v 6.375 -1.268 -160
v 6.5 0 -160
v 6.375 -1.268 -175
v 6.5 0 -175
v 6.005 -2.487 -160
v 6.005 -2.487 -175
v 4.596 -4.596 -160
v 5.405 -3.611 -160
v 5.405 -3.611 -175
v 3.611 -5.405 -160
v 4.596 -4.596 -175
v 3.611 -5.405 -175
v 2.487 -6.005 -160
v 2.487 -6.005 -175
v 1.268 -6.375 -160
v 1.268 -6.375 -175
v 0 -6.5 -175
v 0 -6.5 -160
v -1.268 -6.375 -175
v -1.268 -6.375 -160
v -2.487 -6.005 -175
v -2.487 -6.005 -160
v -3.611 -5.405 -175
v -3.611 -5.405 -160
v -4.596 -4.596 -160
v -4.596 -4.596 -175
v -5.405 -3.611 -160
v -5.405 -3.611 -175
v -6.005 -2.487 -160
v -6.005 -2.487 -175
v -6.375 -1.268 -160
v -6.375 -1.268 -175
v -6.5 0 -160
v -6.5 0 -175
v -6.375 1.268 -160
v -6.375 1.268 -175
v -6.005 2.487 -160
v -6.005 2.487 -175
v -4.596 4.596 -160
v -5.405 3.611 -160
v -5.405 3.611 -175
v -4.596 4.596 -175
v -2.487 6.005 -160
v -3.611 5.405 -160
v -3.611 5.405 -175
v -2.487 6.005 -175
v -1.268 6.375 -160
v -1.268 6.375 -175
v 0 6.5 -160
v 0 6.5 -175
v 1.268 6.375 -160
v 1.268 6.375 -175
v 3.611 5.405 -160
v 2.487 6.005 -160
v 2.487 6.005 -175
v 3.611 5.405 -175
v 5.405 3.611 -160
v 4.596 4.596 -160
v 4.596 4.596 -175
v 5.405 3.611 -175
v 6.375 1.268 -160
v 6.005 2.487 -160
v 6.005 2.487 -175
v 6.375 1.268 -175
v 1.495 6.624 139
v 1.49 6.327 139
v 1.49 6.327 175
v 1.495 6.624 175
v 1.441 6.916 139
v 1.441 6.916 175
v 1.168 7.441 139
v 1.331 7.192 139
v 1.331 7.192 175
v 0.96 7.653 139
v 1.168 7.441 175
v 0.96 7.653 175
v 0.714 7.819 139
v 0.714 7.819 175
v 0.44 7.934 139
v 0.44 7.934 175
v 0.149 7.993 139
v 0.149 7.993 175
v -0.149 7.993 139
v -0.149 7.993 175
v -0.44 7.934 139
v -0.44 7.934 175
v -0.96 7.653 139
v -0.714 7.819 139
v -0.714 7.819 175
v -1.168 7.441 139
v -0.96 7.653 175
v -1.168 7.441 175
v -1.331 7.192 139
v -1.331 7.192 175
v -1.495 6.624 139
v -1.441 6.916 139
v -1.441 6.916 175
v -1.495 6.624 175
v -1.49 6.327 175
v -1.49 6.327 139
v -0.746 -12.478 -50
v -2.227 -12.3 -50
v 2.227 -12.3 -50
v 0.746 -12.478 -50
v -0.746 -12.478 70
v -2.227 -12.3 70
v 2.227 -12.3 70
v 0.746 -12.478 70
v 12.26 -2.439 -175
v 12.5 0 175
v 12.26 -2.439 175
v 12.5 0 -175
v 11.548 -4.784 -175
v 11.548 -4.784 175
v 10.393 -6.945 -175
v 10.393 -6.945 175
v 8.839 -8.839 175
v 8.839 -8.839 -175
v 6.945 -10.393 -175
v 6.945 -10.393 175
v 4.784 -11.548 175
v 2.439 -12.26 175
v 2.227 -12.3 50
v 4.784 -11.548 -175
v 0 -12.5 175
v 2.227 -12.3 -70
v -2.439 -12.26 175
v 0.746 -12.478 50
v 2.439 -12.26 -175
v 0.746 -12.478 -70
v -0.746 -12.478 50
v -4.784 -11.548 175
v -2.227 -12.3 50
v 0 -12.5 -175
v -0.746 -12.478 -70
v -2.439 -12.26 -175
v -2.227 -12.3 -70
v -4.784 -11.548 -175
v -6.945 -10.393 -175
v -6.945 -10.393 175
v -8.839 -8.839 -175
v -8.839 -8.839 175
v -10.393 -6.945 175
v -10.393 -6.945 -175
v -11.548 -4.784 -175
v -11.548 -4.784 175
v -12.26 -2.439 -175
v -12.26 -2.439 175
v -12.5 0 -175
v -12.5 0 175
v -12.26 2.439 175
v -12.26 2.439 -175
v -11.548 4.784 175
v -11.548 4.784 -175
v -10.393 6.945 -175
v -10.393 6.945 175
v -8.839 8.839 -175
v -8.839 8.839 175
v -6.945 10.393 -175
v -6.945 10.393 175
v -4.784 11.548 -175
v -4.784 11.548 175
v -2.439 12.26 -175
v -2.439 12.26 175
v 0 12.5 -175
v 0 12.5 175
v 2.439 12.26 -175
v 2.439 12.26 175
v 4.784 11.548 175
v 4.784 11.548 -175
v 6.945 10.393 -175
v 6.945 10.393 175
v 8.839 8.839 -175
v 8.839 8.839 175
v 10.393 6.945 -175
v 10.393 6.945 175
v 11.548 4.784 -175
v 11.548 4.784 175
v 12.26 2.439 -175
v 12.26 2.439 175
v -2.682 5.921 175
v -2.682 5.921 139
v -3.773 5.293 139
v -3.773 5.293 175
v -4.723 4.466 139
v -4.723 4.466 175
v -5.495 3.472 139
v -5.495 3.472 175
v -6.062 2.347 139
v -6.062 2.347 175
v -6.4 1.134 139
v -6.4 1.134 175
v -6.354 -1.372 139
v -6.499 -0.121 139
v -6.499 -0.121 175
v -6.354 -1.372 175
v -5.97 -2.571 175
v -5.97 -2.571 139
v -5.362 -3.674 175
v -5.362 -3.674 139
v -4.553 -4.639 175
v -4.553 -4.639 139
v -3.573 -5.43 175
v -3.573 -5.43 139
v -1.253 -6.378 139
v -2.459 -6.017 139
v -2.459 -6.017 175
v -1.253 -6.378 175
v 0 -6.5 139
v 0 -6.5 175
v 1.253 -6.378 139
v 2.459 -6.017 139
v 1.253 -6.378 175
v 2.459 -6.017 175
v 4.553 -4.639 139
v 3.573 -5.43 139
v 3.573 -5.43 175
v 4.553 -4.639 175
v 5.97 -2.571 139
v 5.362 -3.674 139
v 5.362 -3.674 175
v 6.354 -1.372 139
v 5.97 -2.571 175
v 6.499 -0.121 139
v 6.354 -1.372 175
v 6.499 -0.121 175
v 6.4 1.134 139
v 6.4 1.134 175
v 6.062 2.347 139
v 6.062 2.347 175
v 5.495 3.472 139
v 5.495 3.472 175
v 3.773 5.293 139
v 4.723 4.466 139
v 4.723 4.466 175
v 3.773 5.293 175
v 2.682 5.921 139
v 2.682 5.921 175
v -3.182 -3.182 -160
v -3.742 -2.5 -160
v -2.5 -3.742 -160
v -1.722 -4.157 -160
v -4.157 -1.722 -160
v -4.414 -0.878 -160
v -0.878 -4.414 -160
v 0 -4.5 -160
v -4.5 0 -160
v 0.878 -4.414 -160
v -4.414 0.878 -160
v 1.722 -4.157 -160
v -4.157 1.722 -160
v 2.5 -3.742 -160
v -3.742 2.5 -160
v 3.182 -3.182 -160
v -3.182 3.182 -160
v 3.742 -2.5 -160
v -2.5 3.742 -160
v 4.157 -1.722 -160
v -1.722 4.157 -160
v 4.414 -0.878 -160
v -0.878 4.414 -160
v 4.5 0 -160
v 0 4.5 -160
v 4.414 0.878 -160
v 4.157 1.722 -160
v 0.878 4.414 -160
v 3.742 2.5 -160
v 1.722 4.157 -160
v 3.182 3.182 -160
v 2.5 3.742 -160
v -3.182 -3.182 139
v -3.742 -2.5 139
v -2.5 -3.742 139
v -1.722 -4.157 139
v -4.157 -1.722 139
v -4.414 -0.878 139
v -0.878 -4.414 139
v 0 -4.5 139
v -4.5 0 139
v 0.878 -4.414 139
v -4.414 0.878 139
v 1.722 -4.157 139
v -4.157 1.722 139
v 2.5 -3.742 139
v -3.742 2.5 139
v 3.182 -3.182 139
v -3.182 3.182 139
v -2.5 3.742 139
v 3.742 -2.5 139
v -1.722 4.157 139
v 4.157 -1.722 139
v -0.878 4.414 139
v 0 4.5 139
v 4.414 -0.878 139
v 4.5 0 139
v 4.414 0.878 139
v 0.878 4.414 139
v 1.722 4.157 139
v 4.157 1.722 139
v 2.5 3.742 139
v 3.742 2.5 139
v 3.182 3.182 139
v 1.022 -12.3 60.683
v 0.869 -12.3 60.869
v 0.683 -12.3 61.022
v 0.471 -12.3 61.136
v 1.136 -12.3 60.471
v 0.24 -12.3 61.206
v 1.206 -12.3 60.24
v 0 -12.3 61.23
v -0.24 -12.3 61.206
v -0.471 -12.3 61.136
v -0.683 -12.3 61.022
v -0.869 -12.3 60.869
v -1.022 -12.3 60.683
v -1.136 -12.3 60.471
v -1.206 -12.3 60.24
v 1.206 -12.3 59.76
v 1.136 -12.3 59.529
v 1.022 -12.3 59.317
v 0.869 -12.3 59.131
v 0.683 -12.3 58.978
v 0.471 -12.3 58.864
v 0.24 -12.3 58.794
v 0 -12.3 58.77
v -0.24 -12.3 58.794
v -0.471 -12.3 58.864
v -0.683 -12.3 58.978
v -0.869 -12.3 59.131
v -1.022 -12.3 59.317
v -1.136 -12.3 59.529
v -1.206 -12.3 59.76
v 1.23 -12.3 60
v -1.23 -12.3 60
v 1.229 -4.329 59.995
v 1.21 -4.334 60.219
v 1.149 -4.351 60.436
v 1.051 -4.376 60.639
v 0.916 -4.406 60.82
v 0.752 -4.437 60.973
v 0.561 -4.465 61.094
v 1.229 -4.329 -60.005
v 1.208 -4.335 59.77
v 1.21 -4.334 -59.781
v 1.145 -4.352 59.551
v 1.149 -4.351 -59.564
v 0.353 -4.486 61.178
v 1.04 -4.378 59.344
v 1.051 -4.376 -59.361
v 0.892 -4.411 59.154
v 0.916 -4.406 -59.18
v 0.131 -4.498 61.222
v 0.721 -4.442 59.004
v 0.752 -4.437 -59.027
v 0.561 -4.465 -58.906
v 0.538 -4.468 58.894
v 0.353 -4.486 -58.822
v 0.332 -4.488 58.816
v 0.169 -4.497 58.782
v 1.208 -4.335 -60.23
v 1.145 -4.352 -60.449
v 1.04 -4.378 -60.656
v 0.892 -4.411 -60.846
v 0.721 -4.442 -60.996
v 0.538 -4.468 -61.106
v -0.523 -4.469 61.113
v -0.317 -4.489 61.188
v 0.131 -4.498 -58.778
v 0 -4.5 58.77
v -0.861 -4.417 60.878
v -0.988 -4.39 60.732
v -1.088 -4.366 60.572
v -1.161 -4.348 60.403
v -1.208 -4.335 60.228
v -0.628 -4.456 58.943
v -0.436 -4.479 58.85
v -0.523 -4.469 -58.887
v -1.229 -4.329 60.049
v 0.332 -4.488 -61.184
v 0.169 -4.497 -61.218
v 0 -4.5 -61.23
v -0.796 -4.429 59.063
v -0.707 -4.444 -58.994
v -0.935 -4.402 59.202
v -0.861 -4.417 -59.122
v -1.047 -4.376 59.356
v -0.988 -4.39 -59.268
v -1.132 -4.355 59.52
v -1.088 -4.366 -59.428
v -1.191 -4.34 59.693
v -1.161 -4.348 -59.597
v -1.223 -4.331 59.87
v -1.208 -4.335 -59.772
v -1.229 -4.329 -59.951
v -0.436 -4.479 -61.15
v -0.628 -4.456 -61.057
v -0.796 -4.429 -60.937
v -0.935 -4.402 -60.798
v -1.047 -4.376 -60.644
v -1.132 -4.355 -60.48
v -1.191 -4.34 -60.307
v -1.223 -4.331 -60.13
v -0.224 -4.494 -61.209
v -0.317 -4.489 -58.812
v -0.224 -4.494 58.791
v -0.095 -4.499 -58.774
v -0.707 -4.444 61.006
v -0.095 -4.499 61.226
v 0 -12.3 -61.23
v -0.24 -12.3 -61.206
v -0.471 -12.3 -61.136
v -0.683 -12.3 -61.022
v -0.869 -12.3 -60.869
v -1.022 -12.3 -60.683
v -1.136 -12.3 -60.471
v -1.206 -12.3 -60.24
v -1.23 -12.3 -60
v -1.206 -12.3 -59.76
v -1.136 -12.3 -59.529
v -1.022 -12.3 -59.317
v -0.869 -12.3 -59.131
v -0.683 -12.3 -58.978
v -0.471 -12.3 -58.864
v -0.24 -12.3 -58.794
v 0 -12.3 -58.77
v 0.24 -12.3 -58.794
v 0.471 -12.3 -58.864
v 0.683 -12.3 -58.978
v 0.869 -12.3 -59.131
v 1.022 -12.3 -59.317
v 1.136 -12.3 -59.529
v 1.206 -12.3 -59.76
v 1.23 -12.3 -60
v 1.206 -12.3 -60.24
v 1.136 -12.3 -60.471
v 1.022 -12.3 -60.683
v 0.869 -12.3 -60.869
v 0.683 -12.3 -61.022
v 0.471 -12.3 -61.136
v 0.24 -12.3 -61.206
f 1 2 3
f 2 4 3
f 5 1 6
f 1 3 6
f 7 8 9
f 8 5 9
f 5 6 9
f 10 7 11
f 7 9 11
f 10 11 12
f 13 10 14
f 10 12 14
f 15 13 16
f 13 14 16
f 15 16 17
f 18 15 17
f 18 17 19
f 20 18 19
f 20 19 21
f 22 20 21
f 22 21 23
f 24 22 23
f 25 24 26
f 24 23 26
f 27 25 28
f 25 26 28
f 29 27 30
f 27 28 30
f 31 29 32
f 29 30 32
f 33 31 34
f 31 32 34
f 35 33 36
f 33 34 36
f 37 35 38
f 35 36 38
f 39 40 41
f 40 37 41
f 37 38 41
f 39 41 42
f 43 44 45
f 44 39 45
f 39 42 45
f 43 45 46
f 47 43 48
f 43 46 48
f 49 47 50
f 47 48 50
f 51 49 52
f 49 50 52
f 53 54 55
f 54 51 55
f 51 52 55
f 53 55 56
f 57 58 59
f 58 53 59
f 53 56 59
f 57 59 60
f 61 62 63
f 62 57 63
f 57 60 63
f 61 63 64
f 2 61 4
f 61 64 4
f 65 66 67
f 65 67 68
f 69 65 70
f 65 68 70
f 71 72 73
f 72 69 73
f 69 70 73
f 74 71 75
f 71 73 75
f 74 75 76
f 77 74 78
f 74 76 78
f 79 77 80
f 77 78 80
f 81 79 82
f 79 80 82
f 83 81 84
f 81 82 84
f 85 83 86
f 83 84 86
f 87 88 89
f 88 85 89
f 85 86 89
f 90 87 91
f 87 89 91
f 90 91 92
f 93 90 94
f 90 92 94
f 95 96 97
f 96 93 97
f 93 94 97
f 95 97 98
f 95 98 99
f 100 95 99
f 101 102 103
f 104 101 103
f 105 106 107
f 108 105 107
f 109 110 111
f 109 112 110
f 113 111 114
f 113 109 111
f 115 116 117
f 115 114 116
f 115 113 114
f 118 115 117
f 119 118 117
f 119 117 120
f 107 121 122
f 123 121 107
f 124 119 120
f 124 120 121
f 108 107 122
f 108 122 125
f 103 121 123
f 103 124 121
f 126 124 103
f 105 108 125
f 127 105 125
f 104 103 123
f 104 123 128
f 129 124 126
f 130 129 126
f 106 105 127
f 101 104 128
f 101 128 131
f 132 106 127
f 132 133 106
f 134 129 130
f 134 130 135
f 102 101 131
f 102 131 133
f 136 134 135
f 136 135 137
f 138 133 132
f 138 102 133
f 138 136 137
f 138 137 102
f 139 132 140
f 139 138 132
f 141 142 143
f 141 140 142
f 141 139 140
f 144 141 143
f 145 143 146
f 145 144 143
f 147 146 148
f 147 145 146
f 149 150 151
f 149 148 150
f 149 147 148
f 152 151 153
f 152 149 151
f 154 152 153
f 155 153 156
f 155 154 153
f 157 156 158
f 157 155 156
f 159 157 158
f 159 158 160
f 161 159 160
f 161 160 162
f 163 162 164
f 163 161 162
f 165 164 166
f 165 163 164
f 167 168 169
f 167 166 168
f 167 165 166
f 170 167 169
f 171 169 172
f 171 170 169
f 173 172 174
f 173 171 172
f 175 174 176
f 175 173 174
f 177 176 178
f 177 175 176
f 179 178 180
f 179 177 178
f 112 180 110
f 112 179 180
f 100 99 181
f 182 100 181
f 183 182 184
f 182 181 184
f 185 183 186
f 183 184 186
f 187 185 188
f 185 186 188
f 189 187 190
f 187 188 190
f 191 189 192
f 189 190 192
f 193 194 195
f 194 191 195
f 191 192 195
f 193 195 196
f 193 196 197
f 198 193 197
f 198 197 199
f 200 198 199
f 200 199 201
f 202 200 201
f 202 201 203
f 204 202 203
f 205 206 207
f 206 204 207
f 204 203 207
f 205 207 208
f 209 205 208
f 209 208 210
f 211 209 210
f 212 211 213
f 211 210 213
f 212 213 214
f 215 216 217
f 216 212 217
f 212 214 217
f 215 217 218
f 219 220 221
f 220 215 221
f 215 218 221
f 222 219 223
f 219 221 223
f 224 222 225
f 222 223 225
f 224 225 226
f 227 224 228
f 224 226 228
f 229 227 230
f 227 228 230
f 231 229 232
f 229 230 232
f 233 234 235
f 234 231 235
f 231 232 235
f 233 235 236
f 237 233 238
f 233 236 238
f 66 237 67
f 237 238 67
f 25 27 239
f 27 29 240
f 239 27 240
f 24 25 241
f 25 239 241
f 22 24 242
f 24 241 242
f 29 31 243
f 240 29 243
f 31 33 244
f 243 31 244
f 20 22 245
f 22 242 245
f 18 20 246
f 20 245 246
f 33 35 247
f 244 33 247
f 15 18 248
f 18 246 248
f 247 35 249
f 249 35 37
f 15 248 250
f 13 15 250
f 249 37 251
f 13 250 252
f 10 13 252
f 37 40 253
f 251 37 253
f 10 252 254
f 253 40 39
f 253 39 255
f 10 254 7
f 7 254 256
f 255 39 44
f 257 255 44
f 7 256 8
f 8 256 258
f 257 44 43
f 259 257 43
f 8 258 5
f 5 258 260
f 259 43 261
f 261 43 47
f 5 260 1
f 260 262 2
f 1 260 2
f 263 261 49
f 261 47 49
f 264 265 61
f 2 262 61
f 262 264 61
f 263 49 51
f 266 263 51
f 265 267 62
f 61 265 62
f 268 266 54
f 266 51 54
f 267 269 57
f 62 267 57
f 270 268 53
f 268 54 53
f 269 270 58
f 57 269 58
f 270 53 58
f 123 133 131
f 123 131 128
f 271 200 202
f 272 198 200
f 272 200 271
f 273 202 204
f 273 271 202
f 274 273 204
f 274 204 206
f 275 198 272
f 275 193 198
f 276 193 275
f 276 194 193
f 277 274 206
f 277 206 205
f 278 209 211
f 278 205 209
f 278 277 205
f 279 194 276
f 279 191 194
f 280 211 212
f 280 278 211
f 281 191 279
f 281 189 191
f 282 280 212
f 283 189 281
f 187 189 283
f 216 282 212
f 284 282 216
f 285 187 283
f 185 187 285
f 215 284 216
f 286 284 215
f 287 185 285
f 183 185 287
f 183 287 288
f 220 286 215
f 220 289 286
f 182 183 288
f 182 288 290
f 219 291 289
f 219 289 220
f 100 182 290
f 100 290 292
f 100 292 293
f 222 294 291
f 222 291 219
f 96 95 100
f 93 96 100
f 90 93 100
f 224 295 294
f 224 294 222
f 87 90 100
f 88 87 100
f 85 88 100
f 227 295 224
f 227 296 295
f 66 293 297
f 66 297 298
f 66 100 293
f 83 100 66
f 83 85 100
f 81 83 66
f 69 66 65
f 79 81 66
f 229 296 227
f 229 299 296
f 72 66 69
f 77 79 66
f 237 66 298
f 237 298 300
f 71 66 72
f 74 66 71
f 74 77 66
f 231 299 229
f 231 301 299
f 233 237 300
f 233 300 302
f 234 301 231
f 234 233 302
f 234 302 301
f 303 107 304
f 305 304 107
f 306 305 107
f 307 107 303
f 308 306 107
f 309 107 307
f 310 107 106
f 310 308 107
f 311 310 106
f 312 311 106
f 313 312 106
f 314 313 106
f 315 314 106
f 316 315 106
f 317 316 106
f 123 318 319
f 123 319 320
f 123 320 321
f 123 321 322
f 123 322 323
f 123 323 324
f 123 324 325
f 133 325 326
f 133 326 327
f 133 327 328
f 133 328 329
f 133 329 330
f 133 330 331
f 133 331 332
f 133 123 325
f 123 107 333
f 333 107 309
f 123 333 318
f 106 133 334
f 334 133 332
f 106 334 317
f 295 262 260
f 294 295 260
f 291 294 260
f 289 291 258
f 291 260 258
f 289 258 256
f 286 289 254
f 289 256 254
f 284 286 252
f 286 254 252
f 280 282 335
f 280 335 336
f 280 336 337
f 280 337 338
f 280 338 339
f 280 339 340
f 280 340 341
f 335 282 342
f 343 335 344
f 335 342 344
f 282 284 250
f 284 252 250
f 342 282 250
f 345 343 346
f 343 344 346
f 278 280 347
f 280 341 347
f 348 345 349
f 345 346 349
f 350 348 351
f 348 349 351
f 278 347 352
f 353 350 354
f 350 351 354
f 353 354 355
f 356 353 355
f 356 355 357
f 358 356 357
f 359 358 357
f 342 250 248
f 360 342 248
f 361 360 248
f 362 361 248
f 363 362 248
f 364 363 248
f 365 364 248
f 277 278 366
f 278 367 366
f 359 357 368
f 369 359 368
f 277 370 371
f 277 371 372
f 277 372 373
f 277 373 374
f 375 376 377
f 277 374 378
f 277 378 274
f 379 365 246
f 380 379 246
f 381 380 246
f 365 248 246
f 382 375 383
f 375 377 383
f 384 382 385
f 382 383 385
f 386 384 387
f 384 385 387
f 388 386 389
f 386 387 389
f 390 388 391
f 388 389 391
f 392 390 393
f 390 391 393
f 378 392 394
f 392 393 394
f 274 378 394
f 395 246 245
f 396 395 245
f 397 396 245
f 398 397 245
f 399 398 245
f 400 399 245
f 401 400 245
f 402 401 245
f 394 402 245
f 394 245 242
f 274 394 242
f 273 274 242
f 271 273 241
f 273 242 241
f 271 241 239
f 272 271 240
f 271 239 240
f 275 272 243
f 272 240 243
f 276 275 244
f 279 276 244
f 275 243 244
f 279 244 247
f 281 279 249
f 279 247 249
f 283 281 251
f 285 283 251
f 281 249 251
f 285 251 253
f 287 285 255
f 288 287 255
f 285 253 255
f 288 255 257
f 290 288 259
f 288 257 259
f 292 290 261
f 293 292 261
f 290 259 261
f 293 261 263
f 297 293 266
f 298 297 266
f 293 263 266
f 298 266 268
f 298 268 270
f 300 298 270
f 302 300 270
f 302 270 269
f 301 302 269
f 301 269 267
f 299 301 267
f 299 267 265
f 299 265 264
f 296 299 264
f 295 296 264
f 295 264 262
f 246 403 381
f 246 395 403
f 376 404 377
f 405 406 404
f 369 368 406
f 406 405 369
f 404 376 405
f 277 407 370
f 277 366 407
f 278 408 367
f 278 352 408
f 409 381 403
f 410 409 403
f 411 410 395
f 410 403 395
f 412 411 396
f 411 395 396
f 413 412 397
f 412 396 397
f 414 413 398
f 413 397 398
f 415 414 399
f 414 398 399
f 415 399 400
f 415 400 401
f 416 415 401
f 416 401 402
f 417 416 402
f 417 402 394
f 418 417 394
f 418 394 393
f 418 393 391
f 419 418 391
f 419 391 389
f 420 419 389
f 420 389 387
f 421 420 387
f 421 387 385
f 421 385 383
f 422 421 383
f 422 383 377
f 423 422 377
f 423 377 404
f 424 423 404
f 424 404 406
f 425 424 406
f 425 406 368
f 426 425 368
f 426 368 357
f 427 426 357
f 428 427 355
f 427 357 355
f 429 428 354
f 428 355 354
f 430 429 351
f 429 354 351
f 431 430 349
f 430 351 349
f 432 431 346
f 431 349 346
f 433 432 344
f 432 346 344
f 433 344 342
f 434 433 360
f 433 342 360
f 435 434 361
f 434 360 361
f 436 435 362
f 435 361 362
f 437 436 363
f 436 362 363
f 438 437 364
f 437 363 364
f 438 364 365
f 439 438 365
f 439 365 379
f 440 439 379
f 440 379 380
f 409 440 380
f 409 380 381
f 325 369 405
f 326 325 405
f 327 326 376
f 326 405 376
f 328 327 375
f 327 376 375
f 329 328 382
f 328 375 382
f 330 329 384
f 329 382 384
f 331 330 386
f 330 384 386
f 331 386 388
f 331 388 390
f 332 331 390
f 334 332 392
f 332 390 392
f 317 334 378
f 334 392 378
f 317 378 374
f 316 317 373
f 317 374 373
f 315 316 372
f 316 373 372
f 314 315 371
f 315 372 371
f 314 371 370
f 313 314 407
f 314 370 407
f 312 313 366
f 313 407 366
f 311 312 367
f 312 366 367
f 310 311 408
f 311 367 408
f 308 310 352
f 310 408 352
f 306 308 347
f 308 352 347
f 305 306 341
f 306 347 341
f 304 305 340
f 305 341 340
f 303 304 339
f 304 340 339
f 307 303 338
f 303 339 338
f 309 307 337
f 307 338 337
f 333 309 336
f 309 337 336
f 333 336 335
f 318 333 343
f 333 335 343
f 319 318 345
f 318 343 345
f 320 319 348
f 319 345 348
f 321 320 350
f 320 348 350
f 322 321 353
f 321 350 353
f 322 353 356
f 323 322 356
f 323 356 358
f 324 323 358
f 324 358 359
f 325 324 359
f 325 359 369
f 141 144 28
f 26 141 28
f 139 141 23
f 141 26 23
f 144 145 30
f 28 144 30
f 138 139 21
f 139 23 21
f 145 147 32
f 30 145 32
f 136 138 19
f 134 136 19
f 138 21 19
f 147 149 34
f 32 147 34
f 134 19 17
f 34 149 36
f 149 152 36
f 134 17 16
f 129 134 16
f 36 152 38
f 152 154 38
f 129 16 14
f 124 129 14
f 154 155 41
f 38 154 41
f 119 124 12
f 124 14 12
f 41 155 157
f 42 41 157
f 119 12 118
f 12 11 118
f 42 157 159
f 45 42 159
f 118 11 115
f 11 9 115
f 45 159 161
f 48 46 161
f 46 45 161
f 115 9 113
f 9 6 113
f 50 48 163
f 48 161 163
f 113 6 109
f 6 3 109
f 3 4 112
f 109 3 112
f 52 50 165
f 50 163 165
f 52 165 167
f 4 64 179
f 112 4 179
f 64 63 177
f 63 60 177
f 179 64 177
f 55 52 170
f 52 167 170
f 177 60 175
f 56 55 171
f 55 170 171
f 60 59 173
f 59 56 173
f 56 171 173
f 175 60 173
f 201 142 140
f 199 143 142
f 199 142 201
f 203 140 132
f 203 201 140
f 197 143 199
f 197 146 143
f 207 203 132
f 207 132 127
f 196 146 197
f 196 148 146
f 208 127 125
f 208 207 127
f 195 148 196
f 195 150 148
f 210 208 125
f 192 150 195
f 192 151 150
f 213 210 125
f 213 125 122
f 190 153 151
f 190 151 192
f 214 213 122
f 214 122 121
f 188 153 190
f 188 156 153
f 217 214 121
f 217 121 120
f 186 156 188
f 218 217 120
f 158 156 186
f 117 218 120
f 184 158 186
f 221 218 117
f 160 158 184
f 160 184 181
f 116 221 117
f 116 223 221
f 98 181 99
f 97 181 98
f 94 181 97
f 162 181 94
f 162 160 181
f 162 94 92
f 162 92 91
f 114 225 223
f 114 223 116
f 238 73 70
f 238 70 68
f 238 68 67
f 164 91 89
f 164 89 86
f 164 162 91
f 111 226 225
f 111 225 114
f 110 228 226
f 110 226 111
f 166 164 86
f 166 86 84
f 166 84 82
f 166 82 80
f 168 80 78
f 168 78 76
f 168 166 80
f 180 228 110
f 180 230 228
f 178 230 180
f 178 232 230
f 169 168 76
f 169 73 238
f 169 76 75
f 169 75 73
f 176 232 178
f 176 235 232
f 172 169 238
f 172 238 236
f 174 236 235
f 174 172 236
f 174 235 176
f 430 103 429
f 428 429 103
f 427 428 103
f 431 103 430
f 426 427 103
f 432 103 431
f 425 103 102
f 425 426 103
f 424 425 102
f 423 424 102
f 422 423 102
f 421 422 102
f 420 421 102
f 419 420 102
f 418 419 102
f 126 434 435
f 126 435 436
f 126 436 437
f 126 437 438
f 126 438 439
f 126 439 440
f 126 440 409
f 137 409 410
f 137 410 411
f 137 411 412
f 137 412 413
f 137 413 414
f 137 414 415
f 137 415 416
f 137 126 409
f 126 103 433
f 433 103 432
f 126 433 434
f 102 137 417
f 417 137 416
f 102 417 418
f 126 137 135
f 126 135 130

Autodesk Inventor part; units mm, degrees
ref_plane "YZ Plane" through (0, 0, 0) normal (1, 0, 0) x (0, 1, 0)
sketch "草图1" plane through (0, 0, 0) normal (0, 0, 1) x (1, 0, 0)
  circle A0 centre (0, 0) radius 12.5
  dimension "d0" = 25
extrude "拉伸1" add sketch "草图1" along normal mid plane 350
ref_plane "工作平面1" through (0, 0, 175) normal (0, 0, 1) x (1, 0, 0)
ref_plane "工作平面3" through (0, 0, -165) normal (0, 0, 1) x (1, 0, 0)
sketch "草图2" plane through (0, 0, 175) normal (0, 0, 1) x (1, 0, 0)
  circle A0 centre (0, 0) radius 6.5
  dimension "d64" = 13
sketch "草图3" plane through (0, 0, -165) normal (0, 0, 1) x (1, 0, 0)
  circle A0 centre (0, 0) radius 4.5
  circle A1 centre (0, 0) radius 6.5
  dimension "d15" = 9
  dimension "d16" = 13
extrude "拉伸2" cut sketch "草图3" along normal blind 350 contours A0
ref_plane "工作平面4" through (0, 12.5, 0) normal (0, 1, 0) x (-1, 0, 0)
sketch "草图8" plane through (0, 0, 175) normal (0, 0, 1) x (1, 0, 0)
  circle A0 centre (0, 0) radius 6.5 projected
  circle A1 centre (0, 6.5) radius 1.5
  dimension "d37" = 3
ref_plane "工作平面5" through (0, -12.5, 0) normal (0, 1, 0) x (-1, 0, 0)
sketch "草图9" plane through (0, -12.5, 0) normal (0, 1, 0) x (-1, 0, 0)
  point P0 (0, 0)
  point P1 (0, 0)
  point P2 (0, 60)
  point P3 (0, -60)
  dimension "d41" = 60
  dimension "d42" = 60
hole "孔3" at (0, -12.5, 60) at (0, -12.5, -60) direction (0, 1, 0) diameter 2.459 depth 8.8 tip angle 118 thread size "M3x0.5" designation "M3" class "6H" standard "GB Metric profile"
ref_plane "工作平面6" through (0, 0, 60) normal (0, 0, 1) x (1, 0, 0)
sketch "草图11" plane through (0, 0, 60) normal (0, 0, 1) x (1, 0, 0)
  line L0 (0, 0) -> (0, -12.3)
  line L1 (2.2271, -12.3) -> (-2.2271, -12.3)
  arc A0 (2.2271, -12.3) -> (0, 12.5) centre (0, 0) ccw
  arc A1 (0, 12.5) -> (-2.2271, -12.3) centre (0, 0) ccw
  circle A2 centre (0, 0) radius 12.5
extrude "拉伸6" cut sketch "草图11" along normal mid plane 20 contours A2 L1
ref_plane "工作平面7" through (0, 0, -60) normal (0, 0, 1) x (1, 0, 0)
sketch "草图12" plane through (0, 0, -60) normal (0, 0, 1) x (1, 0, 0)
  line L0 (0, 0) -> (0, -12.3)
  line L1 (2.2271, -12.3) -> (-2.2271, -12.3)
  arc A0 (2.2271, -12.3) -> (0, 12.5) centre (0, 0) ccw
  arc A1 (0, 12.5) -> (-2.2271, -12.3) centre (0, 0) ccw
  circle A2 centre (0, 0) radius 12.5
extrude "拉伸7" cut sketch "草图12" along normal mid plane 20 contours A2 L1
ref_plane "工作平面8" through (0, 0, -175) normal (0, 0, 1) x (1, 0, 0)
sketch "草图13" plane through (0, 0, -175) normal (0, 0, 1) x (1, 0, 0)
  circle A0 centre (0, 0) radius 6.5
  dimension "d59" = 13
extrude "拉伸8" cut sketch "草图13" along normal blind 15
extrude "拉伸9" cut sketch "草图2" against normal blind 36
thread "螺纹3" size "M14x0.5" class "6H" standard "GB Metric profile" full length
thread "螺纹5" size "M14x0.5" class "6H" standard "ANSI Metric M Profile" full length
extrude "拉伸10" cut sketch "草图8" against normal blind 36 contours A1 A0 | A0 A1 picked at (0, 5.9871) picked at (-0.0289, 6.9863)
properties part number "殷钢管" material "钢，合金"
